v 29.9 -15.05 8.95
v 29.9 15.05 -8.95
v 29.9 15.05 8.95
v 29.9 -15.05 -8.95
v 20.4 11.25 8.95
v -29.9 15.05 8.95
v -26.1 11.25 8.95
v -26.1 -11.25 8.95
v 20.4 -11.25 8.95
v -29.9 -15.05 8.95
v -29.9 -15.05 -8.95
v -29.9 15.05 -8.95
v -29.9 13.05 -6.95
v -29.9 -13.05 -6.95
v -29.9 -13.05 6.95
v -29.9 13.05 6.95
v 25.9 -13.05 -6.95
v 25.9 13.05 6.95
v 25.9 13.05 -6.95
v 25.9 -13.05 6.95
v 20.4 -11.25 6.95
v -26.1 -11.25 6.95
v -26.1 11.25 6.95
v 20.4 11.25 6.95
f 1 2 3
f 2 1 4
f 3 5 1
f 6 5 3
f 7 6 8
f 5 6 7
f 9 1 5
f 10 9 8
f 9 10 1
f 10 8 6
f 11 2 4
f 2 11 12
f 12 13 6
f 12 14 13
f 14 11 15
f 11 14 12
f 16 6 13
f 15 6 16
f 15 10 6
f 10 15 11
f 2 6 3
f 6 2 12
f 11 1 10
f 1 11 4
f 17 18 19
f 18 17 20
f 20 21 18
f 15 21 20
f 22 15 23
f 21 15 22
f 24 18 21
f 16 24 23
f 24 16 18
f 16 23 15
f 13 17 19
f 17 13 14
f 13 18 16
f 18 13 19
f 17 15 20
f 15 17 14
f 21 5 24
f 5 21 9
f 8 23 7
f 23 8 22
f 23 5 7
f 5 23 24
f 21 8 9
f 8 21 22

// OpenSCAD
inr = [55.2, 25.5, 13.3];
alw = [.3, .3, .3];
thk = [2, 2, 2];
le = 1.5;
te = 1.5;
be = 1.5;
re = 7.2;
out = [for (i = [0:1:2]) inr[i] + 2*(alw[i] + thk[i])];
hlw = [for (i = [0:1:2]) inr[i] + 2*alw[i]];
wnd = [inr.x-le-re, inr.y-te-be, 10];
difference() {
cube(out,center=true);
translate([-thk.x,0,0]) cube(hlw,center=true);
translate([-5,0,0]) cube(hlw,center=true);
translate([(le-re)/2, (be-te)/2, 5])
    cube(wnd,center=true);
}
